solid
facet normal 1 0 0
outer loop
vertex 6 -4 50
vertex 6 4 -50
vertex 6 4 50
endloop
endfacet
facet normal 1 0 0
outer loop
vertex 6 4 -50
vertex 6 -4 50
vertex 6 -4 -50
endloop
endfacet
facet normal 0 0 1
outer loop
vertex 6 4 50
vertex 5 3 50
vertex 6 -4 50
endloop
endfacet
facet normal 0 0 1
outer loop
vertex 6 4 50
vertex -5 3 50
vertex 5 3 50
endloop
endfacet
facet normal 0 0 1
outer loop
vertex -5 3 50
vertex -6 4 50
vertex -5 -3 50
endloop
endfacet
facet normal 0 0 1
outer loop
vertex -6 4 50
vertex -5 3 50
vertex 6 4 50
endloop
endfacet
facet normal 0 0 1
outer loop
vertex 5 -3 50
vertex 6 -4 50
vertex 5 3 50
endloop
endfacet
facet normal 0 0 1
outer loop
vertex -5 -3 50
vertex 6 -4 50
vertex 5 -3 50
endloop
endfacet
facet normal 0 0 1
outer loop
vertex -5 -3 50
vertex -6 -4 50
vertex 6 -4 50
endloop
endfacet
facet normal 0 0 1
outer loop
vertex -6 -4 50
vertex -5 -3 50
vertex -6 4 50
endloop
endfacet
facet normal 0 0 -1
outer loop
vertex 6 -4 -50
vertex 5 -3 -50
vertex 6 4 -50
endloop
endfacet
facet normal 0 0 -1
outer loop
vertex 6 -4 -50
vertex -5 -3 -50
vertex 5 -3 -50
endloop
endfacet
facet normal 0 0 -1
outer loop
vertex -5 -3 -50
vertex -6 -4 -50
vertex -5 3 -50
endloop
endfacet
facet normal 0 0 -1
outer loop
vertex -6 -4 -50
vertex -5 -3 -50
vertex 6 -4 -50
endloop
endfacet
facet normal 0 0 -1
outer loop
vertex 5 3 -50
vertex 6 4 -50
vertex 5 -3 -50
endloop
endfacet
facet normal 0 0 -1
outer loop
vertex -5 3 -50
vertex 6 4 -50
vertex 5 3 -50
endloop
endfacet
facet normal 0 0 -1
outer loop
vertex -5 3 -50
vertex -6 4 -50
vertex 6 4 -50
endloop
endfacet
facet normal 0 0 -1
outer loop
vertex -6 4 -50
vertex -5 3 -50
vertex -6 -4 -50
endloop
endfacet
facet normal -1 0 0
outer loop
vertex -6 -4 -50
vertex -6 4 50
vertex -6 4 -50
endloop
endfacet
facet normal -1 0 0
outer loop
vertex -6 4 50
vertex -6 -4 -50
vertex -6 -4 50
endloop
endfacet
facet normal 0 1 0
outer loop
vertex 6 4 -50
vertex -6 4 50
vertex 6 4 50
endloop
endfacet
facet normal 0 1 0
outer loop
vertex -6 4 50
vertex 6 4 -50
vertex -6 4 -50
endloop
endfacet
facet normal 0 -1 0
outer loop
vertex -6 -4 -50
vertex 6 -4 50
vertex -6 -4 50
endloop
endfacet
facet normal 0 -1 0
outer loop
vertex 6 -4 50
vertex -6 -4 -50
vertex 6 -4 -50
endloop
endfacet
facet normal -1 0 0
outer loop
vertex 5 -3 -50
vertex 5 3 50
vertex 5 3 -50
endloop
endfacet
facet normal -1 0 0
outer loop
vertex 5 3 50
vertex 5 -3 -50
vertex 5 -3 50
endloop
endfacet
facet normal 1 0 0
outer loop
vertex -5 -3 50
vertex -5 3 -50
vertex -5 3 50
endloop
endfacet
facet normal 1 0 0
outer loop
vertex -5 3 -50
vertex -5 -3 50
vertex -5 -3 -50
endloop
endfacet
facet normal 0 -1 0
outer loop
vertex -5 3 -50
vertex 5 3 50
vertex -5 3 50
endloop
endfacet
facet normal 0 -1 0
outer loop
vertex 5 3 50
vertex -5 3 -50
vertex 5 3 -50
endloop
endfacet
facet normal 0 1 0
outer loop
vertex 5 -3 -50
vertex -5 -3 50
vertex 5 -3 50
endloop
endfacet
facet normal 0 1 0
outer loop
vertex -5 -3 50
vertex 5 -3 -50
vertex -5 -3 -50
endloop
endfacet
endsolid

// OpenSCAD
// Aluminium rectangular hollow box section: 12mm x 8mm x 1mm wall

outer_width_mm     = 12;   // X
outer_height_mm    = 8;    // Y
wall_thickness_mm  = 1;    // wall thickness
length_mm          = 100;  // Z (extrusion length)
eps_mm             = 0.02; // small overlap to avoid coplanar faces

module box_section_rect_tube(ow, oh, t, L, eps=0.02) {
    iw = ow - 2*t;
    ih = oh - 2*t;

    assert(iw > 0 && ih > 0, "Wall thickness too large for given outer dimensions.");

    // Outer solid minus inner void (void is longer and shifted so ends are open)
    difference() {
        cube([ow, oh, L], center=true);

        // Make the inner cut slightly longer and offset so it fully opens both ends
        translate([0, 0, 0])
            cube([iw, ih, L + 2*eps], center=true);
    }
}

box_section_rect_tube(outer_width_mm, outer_height_mm, wall_thickness_mm, length_mm, eps_mm);
